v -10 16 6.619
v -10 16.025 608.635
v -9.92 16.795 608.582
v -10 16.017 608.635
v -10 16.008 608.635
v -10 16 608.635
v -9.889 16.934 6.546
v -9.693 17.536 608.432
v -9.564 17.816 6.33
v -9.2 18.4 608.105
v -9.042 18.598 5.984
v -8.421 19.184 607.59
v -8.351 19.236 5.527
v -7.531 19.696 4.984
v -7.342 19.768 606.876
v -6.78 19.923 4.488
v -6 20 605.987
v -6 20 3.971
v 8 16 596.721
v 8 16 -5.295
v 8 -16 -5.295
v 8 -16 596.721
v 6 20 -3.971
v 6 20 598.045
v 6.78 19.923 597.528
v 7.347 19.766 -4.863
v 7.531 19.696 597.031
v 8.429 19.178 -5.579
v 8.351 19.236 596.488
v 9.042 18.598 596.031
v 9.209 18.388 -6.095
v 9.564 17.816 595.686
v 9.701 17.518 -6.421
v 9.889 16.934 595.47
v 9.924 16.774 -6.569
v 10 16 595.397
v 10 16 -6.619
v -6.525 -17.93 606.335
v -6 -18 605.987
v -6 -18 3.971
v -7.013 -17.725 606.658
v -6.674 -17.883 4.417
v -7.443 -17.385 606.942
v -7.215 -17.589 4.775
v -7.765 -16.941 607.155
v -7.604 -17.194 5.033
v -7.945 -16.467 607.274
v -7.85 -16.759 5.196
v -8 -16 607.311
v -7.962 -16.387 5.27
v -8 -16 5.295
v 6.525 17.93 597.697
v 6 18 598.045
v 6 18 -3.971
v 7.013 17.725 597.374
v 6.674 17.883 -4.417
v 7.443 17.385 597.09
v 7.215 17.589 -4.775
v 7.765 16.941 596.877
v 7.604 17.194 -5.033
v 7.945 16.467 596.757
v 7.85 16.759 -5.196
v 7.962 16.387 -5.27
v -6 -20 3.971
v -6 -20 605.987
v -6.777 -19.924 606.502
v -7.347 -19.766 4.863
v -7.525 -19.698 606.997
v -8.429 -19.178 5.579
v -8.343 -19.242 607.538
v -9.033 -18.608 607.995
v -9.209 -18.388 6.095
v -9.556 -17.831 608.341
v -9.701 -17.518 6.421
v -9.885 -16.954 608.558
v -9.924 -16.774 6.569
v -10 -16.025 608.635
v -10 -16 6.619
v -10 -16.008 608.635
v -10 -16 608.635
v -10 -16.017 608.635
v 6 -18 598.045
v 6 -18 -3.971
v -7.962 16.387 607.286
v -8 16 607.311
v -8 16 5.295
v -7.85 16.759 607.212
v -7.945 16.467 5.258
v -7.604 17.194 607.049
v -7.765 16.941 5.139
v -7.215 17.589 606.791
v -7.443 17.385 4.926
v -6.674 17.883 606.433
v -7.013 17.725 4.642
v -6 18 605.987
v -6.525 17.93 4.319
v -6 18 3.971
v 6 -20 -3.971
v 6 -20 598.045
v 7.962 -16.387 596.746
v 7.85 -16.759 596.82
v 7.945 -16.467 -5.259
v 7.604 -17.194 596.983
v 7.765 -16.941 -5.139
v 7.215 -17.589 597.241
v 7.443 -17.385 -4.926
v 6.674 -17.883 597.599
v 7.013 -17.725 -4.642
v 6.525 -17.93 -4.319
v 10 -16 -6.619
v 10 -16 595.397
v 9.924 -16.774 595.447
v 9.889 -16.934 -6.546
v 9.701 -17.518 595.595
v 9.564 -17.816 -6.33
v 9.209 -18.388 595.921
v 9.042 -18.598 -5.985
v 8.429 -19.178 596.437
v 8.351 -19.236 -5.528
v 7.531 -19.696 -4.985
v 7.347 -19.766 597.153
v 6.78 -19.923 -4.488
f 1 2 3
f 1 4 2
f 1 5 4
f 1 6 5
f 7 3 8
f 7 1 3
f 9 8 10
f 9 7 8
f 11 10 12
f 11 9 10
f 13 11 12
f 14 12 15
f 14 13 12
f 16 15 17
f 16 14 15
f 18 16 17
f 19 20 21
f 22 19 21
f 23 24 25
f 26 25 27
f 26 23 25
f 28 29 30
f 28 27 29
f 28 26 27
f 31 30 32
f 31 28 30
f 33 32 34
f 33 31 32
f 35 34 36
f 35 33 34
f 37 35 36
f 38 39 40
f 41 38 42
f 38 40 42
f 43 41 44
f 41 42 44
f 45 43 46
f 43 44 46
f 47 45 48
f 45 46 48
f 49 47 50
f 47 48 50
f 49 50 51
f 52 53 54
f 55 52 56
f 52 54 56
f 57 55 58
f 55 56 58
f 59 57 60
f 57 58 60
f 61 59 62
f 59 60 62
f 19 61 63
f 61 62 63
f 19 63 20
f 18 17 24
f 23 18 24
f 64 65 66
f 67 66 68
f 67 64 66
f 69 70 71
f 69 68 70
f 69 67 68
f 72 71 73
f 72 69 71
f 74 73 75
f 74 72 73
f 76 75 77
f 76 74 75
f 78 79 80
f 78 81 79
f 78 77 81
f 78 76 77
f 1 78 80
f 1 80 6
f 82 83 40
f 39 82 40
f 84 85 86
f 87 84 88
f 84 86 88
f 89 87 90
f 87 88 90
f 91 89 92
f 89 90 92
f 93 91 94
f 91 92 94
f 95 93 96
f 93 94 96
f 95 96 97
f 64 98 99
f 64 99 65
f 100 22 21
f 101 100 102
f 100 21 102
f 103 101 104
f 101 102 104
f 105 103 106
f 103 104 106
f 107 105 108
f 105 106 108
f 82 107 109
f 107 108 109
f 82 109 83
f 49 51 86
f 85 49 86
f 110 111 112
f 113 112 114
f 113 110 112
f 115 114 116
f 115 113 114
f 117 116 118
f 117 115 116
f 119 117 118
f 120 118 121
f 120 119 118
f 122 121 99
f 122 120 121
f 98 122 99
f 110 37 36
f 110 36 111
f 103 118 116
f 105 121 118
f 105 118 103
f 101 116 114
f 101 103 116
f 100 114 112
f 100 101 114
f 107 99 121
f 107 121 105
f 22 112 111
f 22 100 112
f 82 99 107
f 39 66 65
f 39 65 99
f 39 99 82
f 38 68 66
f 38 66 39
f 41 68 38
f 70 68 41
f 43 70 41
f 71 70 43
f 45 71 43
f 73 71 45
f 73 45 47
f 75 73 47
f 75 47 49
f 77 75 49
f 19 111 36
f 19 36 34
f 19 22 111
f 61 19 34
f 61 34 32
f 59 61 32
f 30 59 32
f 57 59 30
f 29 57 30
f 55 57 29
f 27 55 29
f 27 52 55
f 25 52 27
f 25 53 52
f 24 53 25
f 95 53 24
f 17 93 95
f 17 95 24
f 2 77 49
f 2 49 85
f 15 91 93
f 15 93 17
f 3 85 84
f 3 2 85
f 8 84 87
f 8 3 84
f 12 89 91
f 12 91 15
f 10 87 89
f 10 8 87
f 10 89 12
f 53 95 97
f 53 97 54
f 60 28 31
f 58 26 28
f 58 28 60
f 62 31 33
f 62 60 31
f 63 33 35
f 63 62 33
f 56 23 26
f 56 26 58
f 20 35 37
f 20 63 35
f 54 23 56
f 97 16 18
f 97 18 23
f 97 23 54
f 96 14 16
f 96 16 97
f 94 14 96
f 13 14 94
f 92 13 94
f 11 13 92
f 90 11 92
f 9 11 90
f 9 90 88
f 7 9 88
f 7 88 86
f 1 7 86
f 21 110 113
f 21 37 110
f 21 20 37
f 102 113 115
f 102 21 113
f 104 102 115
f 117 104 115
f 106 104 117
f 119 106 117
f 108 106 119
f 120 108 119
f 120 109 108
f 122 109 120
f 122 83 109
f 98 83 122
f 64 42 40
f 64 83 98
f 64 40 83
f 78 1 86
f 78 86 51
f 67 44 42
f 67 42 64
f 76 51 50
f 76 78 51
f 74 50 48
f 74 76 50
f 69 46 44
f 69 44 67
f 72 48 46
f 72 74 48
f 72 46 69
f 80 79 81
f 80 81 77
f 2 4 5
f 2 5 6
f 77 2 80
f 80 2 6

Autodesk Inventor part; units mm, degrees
ref_plane "Start Plane" through (0, 0, -6.6189) normal (0, 0, 1) x (1, 0, 0)
ref_plane "End Plane" through (0, 0, 608.6348) normal (0, 0, 1) x (1, 0, 0)
sketch "Sketch" plane through (0, 0, 0) normal (0, 0, 1) x (1, 0, 0)
  line L0 (-10, -16) -> (-10, 16)
  line L1 (-6, 20) -> (6, 20)
  line L2 (10, 16) -> (10, -16)
  line L3 (6, -20) -> (-6, -20)
  arc A0 (-10, -16) -> (-6, -20) centre (-6, -16) ccw
  arc A1 (10, 16) -> (6, 20) centre (6, 16) ccw
  arc A2 (-6, 20) -> (-10, 16) centre (-6, 16) ccw
  arc A3 (6, -20) -> (10, -16) centre (6, -16) ccw
  arc A4 (-6, 18) -> (-8, 16) centre (-6, 16) ccw
  line L4 (-6, 18) -> (6, 18)
  arc A5 (8, 16) -> (6, 18) centre (6, 16) ccw
  line L5 (8, 16) -> (8, -16)
  arc A6 (6, -18) -> (8, -16) centre (6, -16) ccw
  line L6 (6, -18) -> (-6, -18)
  arc A7 (-8, -16) -> (-6, -18) centre (-6, -16) ccw
  line L7 (-8, -16) -> (-8, 16)
  line L8 (0, 29.1598) -> (0, -29.1598) construction
  line L9 (-15.1598, 0) -> (15.1598, 0) construction
  dimension "d7" = 4
  dimension "d9" = 20
  dimension "d11" = 40
  dimension "d12" = 2
  dimension "d15" = 10
  dimension "d16" = 20
extrude "Body" add sketch "Sketch" along normal up to surface (615.2536 mm away) from surface at -6.6189
sketch "Sketch3" plane through (0, 0, 0) normal (0, 0, 1) x (1, 0, 0)
  line L0 (0, 0) -> (10, 0)
ref_plane "Work Plane3" through (0, 0, 0) normal (0, -1, 0) x (1, 0, 0)
ref_plane "Work Plane4" through (-342.9253, 16, 828.9932) normal (0.5519, 0, 0.8339) x (0.8339, 0, -0.5519)
split "Split1" plane through (-342.9253, 16, 828.9932) removes the side toward (0.5519, 0, 0.8339)
ref_plane "Work Plane5" through (-331.8866, -16, 219.6709) normal (-0.5519, 0, -0.8339) x (-0.8339, 0, 0.5519)
split "Split2" plane through (-331.8866, -16, 219.6709) removes the side toward (-0.5519, 0, -0.8339)
sketch "Sketch4" plane through (0, 0, 0) normal (0, -1, 0) x (1, 0, 0)
  line L0 (-2, -6.6189) -> (12, -6.6189) projected
  line L1 (-2, 608.6348) -> (12, 608.6348) projected
  dimension "d18" = 615.2536
equation "\"d7\" = G_IR"
equation "\"d9\" = G_W"
equation "\"d11\" = G_H"
equation "\"d12\" = G_T"
equation "\"d15\" = 0.5 * d9"
equation "\"d16\" = 0.5 * d11"
equation "\"d3\" = G_L"
equation "\"G_W\" = 20"
equation "\"G_H\" = 40"
equation "\"G_T\" = 2"
equation "\"G_IR\" = 4"
equation "\"G_L\" = d18"
equation "\"G_OFFSET_START\" = 6.61886"
equation "\"G_OFFSET_END\" = -17.36524"
equation "\"d13\" = -G_OFFSET_START"
equation "\"d14\" = G_OFFSET_END + B_L"
equation "\"B_L\" = 626"
properties part number "ISO 4019 - 40x20x2 - 615,25" material "Steel, Mild"
